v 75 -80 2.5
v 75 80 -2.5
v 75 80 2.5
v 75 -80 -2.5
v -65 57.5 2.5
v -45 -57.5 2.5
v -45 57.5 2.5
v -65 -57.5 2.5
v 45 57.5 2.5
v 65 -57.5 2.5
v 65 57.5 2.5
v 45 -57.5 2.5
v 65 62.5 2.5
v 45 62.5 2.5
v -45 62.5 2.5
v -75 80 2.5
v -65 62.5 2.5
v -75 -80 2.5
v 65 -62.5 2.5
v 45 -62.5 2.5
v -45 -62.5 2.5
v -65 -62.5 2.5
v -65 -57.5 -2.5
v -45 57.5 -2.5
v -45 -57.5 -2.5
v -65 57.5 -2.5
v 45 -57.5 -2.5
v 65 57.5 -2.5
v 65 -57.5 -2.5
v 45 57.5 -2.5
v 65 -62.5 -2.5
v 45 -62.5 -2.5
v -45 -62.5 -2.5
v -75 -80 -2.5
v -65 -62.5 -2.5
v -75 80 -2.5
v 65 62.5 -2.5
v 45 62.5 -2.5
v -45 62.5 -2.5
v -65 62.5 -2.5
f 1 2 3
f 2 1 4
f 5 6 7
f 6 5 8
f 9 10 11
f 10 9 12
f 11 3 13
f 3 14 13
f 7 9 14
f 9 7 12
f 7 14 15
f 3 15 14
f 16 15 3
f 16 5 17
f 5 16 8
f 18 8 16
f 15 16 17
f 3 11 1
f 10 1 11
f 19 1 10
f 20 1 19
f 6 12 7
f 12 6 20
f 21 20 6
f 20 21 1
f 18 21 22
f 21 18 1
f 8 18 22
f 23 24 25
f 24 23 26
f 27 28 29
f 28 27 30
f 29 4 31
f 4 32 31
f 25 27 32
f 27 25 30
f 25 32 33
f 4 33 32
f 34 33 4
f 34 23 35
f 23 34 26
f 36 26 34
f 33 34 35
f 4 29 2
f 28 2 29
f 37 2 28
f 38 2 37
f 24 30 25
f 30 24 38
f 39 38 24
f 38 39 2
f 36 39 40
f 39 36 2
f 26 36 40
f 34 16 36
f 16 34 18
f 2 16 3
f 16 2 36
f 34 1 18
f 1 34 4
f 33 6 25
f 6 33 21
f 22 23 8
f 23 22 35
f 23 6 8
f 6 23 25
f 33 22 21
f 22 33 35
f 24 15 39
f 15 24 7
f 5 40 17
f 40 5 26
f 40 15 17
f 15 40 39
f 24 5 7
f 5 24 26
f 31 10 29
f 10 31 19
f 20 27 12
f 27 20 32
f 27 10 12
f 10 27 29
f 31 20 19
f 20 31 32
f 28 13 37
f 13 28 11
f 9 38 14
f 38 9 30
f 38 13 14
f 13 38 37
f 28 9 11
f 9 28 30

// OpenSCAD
// ========================================
// a 150 x 160 x 5 mm plate with four 20 x 5 mm slots
// NeuroCAD canonical IR; dimensions are millimetres
// ========================================
$fn = 48;

difference() {
  cube(size=[150, 160, 5], center=true);
  translate([-55, -60, 0]) {
    cube(size=[20, 5, 7], center=true);
  }
  translate([-55, 60, 0]) {
    cube(size=[20, 5, 7], center=true);
  }
  translate([55, -60, 0]) {
    cube(size=[20, 5, 7], center=true);
  }
  translate([55, 60, 0]) {
    cube(size=[20, 5, 7], center=true);
  }
}
